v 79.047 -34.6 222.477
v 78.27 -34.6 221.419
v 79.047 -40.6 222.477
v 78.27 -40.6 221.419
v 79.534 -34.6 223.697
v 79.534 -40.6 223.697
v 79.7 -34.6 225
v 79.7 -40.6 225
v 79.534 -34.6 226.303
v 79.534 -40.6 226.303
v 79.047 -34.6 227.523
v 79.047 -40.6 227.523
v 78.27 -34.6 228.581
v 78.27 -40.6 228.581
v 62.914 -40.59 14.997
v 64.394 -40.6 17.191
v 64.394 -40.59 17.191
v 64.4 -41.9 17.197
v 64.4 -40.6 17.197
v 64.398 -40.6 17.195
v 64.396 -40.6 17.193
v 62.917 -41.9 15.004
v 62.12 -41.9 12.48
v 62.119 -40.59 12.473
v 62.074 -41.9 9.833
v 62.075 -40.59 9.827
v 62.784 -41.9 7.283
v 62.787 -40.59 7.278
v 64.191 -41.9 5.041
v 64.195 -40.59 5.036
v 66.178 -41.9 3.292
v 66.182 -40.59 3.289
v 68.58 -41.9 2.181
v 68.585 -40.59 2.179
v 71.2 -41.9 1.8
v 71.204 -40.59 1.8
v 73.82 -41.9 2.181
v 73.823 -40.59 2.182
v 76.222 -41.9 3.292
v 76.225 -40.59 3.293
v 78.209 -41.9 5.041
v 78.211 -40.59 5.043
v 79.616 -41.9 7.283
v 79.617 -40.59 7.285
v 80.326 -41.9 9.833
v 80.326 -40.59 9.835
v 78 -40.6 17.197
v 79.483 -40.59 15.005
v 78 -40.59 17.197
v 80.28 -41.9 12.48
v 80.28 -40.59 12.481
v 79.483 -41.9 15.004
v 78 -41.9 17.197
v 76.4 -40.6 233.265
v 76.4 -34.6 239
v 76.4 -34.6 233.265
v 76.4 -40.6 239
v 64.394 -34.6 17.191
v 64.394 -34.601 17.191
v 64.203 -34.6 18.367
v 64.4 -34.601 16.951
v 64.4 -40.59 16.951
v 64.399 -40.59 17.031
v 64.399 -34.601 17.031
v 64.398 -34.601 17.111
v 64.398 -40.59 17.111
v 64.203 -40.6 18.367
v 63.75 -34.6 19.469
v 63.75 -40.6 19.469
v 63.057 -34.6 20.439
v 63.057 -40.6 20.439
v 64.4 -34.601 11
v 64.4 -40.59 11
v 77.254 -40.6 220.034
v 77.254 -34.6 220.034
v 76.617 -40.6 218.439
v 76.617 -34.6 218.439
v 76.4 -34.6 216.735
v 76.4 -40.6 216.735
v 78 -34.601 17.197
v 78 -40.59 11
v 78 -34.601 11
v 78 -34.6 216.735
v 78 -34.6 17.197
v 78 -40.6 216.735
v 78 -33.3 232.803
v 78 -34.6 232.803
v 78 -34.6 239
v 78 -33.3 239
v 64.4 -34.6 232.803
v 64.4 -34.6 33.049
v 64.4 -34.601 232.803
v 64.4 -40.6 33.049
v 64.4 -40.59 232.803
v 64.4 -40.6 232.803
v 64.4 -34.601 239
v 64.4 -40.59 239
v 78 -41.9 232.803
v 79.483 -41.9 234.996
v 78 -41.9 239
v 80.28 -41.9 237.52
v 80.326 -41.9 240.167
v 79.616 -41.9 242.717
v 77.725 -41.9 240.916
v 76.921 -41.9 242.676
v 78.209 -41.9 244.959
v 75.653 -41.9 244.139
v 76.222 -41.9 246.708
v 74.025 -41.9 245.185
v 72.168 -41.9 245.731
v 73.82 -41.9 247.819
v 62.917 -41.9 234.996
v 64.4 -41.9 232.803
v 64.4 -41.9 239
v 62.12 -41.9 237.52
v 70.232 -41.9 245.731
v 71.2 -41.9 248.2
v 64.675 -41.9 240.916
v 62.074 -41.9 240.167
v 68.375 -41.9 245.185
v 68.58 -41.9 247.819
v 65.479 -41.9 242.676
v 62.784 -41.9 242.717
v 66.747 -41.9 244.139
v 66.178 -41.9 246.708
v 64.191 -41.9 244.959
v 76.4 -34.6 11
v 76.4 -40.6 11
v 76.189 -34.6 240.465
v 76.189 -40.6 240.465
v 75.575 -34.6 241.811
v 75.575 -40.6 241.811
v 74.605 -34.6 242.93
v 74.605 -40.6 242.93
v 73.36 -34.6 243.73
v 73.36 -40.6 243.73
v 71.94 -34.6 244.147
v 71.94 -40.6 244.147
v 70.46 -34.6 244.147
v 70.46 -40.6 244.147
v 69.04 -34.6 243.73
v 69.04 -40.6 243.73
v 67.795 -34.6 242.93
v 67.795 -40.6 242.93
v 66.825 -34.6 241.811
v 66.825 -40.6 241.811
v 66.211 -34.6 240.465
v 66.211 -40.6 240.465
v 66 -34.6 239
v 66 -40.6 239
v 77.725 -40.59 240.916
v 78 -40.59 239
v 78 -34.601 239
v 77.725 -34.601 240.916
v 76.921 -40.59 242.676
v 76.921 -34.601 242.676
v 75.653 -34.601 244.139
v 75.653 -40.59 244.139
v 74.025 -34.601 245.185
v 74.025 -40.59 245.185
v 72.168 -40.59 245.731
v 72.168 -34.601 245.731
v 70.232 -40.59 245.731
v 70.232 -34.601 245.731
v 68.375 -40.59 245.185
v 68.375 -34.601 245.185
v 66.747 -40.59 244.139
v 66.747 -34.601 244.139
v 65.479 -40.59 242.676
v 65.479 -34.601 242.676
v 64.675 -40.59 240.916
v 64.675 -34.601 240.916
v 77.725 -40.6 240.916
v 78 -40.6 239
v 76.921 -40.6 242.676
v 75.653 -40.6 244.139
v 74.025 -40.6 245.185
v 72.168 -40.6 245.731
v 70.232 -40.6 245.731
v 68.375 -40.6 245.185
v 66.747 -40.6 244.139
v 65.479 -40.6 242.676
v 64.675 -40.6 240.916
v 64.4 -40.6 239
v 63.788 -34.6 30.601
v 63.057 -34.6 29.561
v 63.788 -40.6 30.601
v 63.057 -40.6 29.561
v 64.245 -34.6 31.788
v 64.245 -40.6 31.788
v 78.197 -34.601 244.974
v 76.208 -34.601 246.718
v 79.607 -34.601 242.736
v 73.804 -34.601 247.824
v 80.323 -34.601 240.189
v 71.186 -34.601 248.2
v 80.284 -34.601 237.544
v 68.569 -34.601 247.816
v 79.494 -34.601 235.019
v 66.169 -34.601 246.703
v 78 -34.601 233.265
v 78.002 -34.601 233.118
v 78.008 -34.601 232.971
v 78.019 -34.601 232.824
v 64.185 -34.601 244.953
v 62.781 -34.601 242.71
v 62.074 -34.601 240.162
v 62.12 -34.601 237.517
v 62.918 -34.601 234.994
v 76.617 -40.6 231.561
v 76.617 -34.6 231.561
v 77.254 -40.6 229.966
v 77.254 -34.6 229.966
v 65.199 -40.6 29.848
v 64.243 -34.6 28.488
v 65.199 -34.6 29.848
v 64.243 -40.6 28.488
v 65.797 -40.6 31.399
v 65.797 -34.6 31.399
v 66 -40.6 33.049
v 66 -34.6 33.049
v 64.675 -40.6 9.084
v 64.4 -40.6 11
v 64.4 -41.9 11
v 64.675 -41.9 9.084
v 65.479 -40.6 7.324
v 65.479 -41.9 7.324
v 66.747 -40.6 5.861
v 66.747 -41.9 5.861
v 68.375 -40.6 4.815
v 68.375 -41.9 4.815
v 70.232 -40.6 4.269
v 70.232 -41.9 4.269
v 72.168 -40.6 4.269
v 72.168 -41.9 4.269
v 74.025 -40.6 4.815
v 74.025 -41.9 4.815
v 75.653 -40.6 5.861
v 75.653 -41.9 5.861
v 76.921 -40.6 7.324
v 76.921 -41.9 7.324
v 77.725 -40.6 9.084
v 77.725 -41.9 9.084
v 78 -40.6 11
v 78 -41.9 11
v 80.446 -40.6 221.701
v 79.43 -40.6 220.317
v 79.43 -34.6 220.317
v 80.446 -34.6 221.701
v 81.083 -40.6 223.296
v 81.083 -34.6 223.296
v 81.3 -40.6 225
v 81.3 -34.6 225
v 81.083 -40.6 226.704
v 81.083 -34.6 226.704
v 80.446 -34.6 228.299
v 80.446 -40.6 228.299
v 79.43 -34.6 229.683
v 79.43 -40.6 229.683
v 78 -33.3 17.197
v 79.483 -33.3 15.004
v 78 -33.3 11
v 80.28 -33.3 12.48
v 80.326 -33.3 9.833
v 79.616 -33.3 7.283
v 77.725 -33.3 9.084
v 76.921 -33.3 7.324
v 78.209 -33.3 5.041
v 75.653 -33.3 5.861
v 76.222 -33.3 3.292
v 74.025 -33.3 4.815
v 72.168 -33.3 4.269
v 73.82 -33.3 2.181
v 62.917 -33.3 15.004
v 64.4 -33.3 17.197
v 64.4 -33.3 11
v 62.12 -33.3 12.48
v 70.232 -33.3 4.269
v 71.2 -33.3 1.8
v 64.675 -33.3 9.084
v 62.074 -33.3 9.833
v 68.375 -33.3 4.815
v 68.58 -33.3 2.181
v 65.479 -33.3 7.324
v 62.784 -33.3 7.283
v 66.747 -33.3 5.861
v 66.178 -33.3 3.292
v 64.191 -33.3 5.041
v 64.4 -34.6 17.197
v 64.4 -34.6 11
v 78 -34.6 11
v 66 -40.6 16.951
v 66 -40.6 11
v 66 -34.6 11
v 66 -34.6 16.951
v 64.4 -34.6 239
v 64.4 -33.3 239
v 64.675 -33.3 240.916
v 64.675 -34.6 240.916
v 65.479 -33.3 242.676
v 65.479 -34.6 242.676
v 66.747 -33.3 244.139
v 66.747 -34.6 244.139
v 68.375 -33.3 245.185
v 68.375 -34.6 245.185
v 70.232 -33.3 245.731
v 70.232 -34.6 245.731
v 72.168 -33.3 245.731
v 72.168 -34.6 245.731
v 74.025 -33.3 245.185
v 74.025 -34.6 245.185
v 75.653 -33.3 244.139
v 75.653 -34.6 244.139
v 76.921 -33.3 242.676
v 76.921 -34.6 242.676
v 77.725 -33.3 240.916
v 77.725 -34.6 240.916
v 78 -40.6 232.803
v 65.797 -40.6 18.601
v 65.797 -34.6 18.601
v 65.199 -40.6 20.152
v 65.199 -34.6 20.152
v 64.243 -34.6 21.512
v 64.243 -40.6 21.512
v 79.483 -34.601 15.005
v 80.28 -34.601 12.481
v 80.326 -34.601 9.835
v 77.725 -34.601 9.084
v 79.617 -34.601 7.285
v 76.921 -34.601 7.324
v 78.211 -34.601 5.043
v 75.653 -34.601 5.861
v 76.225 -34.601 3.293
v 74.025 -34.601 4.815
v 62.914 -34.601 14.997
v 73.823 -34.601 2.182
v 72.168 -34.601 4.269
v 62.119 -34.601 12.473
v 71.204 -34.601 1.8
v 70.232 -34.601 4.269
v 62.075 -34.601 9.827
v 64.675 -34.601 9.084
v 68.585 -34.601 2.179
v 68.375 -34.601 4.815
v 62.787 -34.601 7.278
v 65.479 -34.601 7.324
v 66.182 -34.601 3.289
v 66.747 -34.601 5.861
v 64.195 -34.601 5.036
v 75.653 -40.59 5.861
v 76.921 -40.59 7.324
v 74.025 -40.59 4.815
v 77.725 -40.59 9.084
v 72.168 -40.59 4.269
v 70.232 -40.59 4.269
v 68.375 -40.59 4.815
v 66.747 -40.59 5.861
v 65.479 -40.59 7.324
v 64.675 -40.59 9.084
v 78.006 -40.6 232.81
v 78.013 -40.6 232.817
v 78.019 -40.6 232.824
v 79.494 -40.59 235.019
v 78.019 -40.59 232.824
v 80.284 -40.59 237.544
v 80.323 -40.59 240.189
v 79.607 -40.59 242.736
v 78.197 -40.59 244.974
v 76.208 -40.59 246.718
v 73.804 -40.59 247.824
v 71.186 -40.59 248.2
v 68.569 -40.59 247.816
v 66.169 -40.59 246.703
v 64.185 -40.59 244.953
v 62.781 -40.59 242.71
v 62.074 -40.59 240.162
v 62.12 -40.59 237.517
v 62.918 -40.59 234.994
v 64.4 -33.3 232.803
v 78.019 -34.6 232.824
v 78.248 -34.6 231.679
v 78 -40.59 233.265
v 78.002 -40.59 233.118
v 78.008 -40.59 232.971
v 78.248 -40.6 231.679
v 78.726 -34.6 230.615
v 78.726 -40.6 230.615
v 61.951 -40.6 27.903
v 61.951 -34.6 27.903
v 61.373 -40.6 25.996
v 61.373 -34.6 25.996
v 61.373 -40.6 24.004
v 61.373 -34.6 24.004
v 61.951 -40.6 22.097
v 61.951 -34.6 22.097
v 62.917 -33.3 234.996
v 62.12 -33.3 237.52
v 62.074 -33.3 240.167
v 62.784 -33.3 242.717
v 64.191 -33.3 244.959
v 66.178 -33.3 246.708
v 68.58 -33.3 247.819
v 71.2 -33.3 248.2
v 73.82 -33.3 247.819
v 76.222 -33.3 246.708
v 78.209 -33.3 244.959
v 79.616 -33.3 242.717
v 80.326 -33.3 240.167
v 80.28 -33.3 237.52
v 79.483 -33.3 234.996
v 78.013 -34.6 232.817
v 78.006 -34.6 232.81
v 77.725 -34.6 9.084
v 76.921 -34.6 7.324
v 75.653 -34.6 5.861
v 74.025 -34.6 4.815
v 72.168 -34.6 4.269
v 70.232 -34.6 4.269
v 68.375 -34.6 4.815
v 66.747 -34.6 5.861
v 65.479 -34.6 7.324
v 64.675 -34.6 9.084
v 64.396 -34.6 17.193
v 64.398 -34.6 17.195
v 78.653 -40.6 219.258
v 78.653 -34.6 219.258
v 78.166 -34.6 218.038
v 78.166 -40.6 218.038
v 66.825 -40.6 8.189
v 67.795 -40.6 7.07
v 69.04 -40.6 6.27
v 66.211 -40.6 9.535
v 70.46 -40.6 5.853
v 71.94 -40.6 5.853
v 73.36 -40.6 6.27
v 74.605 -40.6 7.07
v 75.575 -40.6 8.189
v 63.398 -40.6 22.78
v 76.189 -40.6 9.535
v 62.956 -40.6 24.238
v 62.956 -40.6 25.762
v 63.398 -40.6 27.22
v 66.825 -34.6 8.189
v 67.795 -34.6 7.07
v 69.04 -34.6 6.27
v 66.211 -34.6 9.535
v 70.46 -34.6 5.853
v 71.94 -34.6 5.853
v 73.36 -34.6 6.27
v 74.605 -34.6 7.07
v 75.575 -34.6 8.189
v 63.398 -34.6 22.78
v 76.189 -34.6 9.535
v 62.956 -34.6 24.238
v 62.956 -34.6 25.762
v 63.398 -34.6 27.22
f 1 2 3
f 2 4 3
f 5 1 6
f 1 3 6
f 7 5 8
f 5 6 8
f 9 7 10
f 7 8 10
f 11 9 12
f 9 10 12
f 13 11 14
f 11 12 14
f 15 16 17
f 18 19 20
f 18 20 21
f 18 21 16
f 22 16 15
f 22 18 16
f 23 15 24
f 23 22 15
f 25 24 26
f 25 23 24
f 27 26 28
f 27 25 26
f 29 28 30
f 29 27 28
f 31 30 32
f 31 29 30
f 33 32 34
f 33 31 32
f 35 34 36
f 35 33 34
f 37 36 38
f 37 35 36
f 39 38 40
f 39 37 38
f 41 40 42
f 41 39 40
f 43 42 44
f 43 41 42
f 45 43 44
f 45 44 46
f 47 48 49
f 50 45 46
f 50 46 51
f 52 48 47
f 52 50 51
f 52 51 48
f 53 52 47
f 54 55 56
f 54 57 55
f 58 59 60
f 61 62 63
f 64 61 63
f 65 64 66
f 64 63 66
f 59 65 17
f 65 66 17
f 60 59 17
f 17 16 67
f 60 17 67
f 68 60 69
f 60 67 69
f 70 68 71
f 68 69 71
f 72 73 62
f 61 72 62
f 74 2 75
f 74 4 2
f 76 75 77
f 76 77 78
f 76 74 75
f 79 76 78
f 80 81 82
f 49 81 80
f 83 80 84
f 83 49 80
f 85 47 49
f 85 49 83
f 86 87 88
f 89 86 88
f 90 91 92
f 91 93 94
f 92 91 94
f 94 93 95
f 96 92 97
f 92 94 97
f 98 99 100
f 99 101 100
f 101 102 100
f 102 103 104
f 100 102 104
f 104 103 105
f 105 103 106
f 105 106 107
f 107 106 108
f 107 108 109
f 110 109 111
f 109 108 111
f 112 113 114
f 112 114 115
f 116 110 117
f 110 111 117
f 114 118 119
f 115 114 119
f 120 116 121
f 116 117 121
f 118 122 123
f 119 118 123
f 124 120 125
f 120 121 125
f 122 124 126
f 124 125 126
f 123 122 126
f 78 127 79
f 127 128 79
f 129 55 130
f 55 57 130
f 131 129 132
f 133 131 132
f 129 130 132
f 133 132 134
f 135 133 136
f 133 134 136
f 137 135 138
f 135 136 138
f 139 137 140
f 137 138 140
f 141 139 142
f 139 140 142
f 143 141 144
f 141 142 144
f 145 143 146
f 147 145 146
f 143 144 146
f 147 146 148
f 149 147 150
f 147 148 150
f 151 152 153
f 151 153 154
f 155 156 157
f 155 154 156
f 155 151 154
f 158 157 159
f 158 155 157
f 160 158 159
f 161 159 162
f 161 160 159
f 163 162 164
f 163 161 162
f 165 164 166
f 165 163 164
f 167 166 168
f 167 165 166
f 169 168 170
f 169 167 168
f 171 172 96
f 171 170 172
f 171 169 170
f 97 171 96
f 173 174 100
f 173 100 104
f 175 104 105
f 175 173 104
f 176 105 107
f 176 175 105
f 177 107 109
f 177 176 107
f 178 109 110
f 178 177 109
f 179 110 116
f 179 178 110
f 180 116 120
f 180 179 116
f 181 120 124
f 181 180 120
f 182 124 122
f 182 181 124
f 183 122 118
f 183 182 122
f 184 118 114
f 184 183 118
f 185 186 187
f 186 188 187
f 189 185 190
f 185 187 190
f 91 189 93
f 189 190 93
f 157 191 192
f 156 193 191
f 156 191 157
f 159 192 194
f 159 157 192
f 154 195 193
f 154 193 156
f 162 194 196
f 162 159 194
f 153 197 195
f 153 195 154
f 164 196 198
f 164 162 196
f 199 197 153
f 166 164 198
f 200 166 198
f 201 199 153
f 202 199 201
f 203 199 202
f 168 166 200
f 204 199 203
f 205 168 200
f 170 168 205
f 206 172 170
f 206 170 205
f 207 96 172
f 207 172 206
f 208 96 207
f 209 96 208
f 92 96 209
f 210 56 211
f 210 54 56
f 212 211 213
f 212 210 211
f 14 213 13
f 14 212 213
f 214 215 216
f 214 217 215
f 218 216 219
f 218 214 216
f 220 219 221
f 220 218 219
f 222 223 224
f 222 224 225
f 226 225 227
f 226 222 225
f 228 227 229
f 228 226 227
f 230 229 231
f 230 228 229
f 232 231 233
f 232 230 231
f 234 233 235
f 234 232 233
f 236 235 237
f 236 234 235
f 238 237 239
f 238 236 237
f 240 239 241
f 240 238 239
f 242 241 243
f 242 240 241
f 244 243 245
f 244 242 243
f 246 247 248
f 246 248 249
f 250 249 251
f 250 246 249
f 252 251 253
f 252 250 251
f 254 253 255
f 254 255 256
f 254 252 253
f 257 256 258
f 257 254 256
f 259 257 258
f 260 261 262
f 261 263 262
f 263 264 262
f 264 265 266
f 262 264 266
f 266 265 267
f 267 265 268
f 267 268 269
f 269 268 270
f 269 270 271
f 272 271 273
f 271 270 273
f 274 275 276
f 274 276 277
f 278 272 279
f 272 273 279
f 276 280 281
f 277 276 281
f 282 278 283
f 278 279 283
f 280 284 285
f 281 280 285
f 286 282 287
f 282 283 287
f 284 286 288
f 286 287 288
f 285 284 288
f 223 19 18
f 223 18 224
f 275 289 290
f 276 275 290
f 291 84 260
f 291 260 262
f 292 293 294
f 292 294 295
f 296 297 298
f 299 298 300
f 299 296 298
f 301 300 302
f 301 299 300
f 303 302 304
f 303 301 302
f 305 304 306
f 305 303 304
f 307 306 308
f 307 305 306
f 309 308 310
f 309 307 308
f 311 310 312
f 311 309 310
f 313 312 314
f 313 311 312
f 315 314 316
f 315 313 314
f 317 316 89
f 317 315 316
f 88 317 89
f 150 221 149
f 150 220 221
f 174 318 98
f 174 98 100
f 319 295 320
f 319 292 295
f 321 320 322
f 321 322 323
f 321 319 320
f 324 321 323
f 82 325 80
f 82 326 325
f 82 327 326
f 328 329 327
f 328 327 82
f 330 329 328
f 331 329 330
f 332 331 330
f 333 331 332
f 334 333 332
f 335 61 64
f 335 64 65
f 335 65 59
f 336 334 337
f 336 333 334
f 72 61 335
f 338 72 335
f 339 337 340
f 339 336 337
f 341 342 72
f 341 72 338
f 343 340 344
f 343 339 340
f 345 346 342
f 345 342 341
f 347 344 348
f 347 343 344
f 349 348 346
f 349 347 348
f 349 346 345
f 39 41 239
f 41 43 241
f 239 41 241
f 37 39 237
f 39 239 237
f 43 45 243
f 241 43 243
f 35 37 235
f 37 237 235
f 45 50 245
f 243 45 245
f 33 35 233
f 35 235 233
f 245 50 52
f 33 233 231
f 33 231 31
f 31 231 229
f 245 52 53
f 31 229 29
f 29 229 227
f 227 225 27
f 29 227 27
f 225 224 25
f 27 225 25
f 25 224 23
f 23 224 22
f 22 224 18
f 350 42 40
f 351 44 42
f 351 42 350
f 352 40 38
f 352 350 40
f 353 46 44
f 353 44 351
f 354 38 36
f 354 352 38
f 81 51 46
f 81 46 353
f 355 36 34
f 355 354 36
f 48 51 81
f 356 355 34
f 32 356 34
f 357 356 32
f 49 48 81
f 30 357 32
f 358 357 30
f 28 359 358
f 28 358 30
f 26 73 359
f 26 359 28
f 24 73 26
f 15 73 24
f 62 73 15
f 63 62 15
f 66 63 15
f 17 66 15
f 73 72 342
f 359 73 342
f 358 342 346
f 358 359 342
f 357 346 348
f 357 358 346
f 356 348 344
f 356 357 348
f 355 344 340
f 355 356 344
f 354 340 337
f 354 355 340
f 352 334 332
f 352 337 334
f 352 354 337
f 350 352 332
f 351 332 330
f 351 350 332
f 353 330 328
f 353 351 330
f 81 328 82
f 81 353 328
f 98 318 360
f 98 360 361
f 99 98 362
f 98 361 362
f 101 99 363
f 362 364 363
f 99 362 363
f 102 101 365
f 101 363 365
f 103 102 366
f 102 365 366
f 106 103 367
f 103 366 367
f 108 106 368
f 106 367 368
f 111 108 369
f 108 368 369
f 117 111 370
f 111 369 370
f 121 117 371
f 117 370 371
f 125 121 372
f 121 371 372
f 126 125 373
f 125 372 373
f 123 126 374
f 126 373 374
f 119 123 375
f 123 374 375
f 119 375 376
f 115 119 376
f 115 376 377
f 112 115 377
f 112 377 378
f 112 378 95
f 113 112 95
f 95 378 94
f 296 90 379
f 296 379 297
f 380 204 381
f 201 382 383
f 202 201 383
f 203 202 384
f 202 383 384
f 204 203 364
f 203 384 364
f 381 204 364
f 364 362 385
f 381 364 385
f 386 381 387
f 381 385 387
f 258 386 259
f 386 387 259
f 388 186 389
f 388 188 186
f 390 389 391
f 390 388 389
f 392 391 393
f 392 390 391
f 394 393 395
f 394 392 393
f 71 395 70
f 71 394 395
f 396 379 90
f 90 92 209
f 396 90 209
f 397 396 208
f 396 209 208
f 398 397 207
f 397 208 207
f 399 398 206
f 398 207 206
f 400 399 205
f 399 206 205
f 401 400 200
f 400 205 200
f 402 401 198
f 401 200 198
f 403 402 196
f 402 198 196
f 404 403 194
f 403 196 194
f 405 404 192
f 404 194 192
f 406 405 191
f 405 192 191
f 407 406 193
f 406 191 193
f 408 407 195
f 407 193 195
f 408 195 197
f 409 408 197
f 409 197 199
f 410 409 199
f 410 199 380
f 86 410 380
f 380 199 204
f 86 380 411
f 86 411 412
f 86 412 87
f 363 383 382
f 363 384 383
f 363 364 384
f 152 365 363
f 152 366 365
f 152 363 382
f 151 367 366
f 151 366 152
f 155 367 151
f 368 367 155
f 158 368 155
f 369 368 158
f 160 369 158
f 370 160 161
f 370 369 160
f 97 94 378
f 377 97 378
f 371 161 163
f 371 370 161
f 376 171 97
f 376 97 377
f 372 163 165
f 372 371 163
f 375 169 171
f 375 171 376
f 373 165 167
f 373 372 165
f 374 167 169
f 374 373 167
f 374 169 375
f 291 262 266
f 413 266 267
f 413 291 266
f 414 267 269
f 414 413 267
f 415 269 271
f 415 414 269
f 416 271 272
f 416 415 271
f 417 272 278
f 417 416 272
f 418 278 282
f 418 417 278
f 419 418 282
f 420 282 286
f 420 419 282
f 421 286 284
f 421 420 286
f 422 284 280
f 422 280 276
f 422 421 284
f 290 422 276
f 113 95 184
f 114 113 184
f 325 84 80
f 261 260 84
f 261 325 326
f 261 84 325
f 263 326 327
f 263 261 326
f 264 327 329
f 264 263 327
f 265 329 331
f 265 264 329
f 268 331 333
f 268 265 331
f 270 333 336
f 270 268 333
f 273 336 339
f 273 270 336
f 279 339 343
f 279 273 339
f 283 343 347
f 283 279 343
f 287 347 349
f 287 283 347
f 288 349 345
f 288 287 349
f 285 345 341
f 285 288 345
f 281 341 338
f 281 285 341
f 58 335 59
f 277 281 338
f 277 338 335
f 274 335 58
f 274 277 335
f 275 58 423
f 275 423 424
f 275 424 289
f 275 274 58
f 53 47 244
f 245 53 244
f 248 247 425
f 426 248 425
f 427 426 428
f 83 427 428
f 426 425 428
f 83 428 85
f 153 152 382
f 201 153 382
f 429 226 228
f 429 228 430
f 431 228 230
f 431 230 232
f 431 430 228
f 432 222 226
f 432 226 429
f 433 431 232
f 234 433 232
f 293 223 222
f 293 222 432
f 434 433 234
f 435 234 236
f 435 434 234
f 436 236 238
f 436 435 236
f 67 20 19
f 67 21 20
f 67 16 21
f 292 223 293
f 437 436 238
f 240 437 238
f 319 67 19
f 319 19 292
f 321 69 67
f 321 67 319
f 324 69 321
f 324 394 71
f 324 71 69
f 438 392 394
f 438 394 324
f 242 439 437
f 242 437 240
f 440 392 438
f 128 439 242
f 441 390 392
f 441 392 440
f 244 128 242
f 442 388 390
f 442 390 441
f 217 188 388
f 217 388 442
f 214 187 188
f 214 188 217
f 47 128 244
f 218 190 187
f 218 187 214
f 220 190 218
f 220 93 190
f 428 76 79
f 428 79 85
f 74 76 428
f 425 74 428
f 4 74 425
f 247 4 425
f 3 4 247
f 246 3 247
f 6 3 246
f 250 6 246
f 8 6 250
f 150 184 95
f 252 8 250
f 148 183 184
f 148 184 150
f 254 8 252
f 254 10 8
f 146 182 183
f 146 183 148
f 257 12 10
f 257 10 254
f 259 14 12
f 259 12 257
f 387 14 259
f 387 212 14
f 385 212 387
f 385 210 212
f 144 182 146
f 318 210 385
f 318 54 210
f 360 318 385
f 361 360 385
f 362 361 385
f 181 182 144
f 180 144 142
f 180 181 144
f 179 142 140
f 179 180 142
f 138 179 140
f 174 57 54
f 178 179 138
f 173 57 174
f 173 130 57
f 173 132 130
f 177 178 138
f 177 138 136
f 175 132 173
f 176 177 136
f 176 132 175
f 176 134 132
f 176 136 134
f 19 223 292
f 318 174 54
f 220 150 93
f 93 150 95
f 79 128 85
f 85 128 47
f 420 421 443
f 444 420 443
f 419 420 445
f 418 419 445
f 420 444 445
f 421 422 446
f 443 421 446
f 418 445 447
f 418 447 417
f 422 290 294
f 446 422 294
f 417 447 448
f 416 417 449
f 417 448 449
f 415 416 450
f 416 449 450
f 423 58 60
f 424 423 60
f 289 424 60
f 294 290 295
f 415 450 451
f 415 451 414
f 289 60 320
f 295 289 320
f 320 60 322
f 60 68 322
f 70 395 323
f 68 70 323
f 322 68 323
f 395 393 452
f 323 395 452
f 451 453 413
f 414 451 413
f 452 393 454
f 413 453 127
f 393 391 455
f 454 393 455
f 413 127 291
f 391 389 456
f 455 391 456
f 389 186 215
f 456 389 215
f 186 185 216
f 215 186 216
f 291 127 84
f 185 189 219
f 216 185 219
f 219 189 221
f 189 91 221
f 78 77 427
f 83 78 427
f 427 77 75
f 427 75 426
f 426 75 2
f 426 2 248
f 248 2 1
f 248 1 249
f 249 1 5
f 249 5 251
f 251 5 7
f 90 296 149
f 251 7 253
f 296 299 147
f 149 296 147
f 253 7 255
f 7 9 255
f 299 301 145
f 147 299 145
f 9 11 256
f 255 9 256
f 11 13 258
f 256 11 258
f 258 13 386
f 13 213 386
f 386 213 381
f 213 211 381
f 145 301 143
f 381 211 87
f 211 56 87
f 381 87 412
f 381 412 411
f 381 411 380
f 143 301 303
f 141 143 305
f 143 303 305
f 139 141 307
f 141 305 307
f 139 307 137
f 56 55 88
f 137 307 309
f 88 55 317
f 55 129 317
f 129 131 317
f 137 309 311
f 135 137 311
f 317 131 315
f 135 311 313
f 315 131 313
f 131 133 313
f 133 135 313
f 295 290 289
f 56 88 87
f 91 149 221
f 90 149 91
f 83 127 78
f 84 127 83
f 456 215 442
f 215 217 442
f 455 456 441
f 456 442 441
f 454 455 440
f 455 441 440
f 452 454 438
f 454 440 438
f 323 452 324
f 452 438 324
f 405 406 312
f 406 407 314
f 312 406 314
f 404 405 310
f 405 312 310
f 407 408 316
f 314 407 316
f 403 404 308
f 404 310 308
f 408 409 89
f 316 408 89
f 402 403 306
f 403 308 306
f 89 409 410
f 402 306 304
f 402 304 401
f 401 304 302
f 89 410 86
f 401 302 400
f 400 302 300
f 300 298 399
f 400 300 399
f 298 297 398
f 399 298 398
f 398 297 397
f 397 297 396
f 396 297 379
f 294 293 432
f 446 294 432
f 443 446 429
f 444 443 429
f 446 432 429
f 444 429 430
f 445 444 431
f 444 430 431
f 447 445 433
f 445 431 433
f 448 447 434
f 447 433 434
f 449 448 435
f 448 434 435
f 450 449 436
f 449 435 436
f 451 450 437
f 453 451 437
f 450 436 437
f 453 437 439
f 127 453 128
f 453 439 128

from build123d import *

# Parameters (mm, degrees)
PAD004_DEPTH      = 3
PAD006_DEPTH      = 1.3
PAD006_DEPTH_BACK = 0.01
PAD007_DEPTH      = 1.3
PAD007_DEPTH_BACK = 0.001


with BuildPart() as part:
    # Sketch018 → Pad004 (new body, symmetric)
    with BuildSketch(Plane(origin=(71.2, -37.6, 0), x_dir=(1, 0, 0), z_dir=(0, -1, 0))):
        with BuildLine():
            ThreePointArc((-6.8, 11), (0, 4.2), (6.8, 11))
            Line((6.8, 11), (6.8, 216.735014))
            ThreePointArc((8.23, 220.316508), (7.170714, 218.663225), (6.8, 216.735014))
            ThreePointArc((8.23, 220.316508), (10.1, 225), (8.23, 229.683492))
            ThreePointArc((6.8, 233.264986), (7.170714, 231.336775), (8.23, 229.683492))
            Line((6.8, 239), (6.8, 233.264986))
            ThreePointArc((6.8, 239), (0, 245.8), (-6.8, 239))
            Line((-6.8, 33.049224), (-6.8, 239))
            ThreePointArc((-8.143333, 29.561227), (-7.147441, 31.180356), (-6.8, 33.049224))
            ThreePointArc((-8.143333, 29.561227), (-9.9, 25), (-8.143333, 20.438773))
            ThreePointArc((-6.8, 16.950776), (-7.147441, 18.819644), (-8.143333, 20.438773))
            Line((-6.8, 11), (-6.8, 16.950776))
        make_face()
        with BuildLine():
            ThreePointArc((-5.2, 11), (0, 5.8), (5.2, 11))
            Line((5.2, 11), (5.2, 216.735014))
            ThreePointArc((7.07, 221.418506), (5.68478, 219.256521), (5.2, 216.735014))
            ThreePointArc((7.07, 221.418506), (8.5, 225), (7.07, 228.581494))
            ThreePointArc((5.2, 233.264986), (5.68478, 230.743479), (7.07, 228.581494))
            Line((5.2, 239), (5.2, 233.264986))
            ThreePointArc((5.2, 239), (0, 244.2), (-5.2, 239))
            Line((-5.2, 33.049224), (-5.2, 239))
            ThreePointArc((-6.956667, 28.487997), (-5.654345, 30.60532), (-5.2, 33.049224))
            ThreePointArc((-6.956667, 28.487997), (-8.3, 25), (-6.956667, 21.512003))
            ThreePointArc((-5.2, 16.950776), (-5.654345, 19.39468), (-6.956667, 21.512003))
            Line((-5.2, 11), (-5.2, 16.950776))
        make_face(mode=Mode.SUBTRACT)
    extrude(amount=PAD004_DEPTH, both=True)

    # Sketch020 (on Face26 of Pad004) → Pad006 (join, two sides)
    with BuildSketch(Plane.XZ.offset(40.6)) as pad006_sk:
        with BuildLine():
            ThreePointArc((64.4, 11), (71.2, 4.2), (78, 11))
            Line((78, 17.196773), (78, 11))
            ThreePointArc((64.4, 17.196773), (71.2, 1.8), (78, 17.196773))
            Line((64.4, 17.196773), (64.4, 11))
        make_face()
        with BuildLine():
            ThreePointArc((78, 239), (71.2, 245.8), (64.4, 239))
            Line((64.4, 232.803227), (64.4, 239))
            ThreePointArc((78, 232.803227), (71.2, 248.2), (64.4, 232.803227))
            Line((78, 232.803227), (78, 239))
        make_face()
    extrude(amount=PAD006_DEPTH)
    extrude(pad006_sk.sketch, amount=-PAD006_DEPTH_BACK)

    # Sketch021 (on Face2 of Pad006) → Pad007 (join, two sides)
    with BuildSketch(Plane(origin=(0, -34.6, 0), x_dir=(1, 0, 0), z_dir=(0, 1, 0))) as pad007_sk:
        with BuildLine():
            ThreePointArc((78, -11), (71.2, -4.2), (64.4, -11))
            Line((64.4, -17.196773), (64.4, -11))
            ThreePointArc((78, -17.196773), (71.2, -1.8), (64.4, -17.196773))
            Line((78, -17.196773), (78, -11))
        make_face()
        with BuildLine():
            ThreePointArc((64.4, -239), (71.2, -245.8), (78, -239))
            Line((78, -232.803227), (78, -239))
            ThreePointArc((64.4, -232.803227), (71.2, -248.2), (78, -232.803227))
            Line((64.4, -232.803227), (64.4, -239))
        make_face()
    extrude(amount=PAD007_DEPTH)
    extrude(pad007_sk.sketch, amount=-PAD007_DEPTH_BACK)


solid = part.part
